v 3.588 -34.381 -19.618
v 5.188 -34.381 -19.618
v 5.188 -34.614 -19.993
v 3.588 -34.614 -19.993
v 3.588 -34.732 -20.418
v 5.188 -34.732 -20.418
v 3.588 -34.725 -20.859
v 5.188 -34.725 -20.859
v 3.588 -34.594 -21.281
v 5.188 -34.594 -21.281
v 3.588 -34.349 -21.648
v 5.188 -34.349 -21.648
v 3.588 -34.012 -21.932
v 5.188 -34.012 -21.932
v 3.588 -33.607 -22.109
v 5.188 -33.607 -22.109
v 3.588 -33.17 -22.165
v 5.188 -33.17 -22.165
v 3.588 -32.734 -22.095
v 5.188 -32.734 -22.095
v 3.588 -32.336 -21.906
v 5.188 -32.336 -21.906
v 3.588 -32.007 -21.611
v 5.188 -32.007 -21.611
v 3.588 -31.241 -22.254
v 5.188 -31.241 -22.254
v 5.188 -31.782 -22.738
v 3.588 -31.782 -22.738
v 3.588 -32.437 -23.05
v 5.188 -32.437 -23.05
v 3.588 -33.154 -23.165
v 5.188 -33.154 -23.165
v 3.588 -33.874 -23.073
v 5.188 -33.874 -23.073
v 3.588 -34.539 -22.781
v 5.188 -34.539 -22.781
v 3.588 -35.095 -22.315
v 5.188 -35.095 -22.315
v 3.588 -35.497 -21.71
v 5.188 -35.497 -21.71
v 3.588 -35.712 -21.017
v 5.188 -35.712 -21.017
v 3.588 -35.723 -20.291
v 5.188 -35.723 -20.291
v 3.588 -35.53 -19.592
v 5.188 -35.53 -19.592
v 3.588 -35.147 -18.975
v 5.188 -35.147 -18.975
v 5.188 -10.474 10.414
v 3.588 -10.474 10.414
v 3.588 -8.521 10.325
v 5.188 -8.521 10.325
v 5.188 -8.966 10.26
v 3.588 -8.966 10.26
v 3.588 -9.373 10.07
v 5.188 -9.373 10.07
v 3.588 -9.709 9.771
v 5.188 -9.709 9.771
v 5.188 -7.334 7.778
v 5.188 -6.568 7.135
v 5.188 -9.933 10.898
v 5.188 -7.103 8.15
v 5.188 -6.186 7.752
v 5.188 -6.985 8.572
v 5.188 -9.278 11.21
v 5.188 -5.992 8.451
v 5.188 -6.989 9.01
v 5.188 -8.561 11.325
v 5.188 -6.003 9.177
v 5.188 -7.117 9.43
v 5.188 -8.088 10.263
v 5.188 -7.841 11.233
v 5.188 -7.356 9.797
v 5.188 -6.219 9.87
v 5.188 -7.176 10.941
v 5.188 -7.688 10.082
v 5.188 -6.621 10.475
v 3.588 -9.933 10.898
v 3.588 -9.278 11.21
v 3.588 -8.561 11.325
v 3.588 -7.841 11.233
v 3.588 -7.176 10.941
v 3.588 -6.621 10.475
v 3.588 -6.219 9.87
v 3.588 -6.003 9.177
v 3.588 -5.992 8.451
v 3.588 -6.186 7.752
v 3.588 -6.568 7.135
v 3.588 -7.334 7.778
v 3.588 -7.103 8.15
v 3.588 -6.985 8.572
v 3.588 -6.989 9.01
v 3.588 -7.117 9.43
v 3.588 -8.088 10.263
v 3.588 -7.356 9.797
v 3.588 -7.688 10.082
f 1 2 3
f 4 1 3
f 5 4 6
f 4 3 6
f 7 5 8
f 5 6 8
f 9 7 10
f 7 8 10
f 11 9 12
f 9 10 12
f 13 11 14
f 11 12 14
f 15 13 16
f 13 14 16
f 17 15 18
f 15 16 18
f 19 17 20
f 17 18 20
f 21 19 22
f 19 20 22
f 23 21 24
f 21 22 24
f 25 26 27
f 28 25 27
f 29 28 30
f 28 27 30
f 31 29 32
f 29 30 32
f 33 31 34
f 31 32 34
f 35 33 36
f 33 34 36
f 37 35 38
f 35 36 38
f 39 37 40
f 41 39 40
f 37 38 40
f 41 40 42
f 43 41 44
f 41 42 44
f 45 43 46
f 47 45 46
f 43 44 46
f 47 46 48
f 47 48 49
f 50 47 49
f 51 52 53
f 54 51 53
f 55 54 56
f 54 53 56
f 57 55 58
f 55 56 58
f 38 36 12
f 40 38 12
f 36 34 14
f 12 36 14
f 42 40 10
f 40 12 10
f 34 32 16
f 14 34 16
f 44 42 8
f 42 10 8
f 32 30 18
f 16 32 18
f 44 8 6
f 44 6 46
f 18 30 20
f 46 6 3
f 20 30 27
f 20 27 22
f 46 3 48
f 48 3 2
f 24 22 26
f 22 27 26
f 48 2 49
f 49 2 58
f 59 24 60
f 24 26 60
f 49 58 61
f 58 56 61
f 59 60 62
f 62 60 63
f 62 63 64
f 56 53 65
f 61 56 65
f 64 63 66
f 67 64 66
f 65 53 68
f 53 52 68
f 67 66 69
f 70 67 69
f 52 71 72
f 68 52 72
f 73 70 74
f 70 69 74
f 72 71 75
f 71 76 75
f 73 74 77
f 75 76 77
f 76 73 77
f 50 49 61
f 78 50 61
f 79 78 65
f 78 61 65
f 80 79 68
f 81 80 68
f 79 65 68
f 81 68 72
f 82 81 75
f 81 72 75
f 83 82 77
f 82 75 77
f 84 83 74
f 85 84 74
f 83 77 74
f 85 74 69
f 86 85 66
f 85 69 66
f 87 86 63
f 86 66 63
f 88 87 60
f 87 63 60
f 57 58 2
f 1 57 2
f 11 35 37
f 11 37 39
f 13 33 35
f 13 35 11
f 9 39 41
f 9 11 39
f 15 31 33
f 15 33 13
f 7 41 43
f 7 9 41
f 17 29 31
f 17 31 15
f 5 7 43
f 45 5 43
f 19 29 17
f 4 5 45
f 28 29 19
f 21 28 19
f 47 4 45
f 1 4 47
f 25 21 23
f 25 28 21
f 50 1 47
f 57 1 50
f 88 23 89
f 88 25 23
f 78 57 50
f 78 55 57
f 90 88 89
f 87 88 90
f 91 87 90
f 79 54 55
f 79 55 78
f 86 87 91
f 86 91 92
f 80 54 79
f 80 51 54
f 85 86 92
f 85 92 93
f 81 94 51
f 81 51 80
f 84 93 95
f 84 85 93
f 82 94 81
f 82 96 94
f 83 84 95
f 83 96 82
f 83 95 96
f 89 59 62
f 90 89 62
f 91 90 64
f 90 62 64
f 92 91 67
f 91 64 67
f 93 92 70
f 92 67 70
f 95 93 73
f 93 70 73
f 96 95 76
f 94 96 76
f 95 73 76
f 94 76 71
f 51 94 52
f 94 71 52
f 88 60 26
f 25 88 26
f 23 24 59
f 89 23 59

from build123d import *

# Parameters (mm, degrees)
BOSS_EXTRUDE1_DEPTH = 1.6


with BuildPart() as part:
    # Sketch1 → Boss-Extrude1 (new body)
    with BuildSketch(Plane.ZY.offset(-5.18823967)):
        with BuildLine():
            ThreePointArc((10.414466289, -10.474403582), (10.727931837, -6.88180851), (7.135336765, -6.568342962))
            Line((7.135336765, -6.568342962), (-22.254454563, -31.241009834))
            ThreePointArc((-22.254454563, -31.241009834), (-22.567920111, -34.833604906), (-18.975325039, -35.147070454))
            Line((-18.975325039, -35.147070454), (10.414466289, -10.474403582))
        make_face()
        with BuildLine():
            ThreePointArc((10.324901527, -8.521373272), (10.179755112, -9.176267465), (9.771499716, -9.708509343))
            Line((9.771499716, -9.708509343), (-19.618291612, -34.381176215))
            ThreePointArc((-19.618291612, -34.381176215), (-21.802025871, -34.190638333), (-21.611487989, -32.006904073))
            Line((-21.611487989, -32.006904073), (7.778303338, -7.334237201))
            ThreePointArc((7.778303338, -7.334237201), (9.42979572, -7.116519687), (10.324901527, -8.521373272))
        make_face(mode=Mode.SUBTRACT)
    extrude(amount=BOSS_EXTRUDE1_DEPTH)


solid = part.part
